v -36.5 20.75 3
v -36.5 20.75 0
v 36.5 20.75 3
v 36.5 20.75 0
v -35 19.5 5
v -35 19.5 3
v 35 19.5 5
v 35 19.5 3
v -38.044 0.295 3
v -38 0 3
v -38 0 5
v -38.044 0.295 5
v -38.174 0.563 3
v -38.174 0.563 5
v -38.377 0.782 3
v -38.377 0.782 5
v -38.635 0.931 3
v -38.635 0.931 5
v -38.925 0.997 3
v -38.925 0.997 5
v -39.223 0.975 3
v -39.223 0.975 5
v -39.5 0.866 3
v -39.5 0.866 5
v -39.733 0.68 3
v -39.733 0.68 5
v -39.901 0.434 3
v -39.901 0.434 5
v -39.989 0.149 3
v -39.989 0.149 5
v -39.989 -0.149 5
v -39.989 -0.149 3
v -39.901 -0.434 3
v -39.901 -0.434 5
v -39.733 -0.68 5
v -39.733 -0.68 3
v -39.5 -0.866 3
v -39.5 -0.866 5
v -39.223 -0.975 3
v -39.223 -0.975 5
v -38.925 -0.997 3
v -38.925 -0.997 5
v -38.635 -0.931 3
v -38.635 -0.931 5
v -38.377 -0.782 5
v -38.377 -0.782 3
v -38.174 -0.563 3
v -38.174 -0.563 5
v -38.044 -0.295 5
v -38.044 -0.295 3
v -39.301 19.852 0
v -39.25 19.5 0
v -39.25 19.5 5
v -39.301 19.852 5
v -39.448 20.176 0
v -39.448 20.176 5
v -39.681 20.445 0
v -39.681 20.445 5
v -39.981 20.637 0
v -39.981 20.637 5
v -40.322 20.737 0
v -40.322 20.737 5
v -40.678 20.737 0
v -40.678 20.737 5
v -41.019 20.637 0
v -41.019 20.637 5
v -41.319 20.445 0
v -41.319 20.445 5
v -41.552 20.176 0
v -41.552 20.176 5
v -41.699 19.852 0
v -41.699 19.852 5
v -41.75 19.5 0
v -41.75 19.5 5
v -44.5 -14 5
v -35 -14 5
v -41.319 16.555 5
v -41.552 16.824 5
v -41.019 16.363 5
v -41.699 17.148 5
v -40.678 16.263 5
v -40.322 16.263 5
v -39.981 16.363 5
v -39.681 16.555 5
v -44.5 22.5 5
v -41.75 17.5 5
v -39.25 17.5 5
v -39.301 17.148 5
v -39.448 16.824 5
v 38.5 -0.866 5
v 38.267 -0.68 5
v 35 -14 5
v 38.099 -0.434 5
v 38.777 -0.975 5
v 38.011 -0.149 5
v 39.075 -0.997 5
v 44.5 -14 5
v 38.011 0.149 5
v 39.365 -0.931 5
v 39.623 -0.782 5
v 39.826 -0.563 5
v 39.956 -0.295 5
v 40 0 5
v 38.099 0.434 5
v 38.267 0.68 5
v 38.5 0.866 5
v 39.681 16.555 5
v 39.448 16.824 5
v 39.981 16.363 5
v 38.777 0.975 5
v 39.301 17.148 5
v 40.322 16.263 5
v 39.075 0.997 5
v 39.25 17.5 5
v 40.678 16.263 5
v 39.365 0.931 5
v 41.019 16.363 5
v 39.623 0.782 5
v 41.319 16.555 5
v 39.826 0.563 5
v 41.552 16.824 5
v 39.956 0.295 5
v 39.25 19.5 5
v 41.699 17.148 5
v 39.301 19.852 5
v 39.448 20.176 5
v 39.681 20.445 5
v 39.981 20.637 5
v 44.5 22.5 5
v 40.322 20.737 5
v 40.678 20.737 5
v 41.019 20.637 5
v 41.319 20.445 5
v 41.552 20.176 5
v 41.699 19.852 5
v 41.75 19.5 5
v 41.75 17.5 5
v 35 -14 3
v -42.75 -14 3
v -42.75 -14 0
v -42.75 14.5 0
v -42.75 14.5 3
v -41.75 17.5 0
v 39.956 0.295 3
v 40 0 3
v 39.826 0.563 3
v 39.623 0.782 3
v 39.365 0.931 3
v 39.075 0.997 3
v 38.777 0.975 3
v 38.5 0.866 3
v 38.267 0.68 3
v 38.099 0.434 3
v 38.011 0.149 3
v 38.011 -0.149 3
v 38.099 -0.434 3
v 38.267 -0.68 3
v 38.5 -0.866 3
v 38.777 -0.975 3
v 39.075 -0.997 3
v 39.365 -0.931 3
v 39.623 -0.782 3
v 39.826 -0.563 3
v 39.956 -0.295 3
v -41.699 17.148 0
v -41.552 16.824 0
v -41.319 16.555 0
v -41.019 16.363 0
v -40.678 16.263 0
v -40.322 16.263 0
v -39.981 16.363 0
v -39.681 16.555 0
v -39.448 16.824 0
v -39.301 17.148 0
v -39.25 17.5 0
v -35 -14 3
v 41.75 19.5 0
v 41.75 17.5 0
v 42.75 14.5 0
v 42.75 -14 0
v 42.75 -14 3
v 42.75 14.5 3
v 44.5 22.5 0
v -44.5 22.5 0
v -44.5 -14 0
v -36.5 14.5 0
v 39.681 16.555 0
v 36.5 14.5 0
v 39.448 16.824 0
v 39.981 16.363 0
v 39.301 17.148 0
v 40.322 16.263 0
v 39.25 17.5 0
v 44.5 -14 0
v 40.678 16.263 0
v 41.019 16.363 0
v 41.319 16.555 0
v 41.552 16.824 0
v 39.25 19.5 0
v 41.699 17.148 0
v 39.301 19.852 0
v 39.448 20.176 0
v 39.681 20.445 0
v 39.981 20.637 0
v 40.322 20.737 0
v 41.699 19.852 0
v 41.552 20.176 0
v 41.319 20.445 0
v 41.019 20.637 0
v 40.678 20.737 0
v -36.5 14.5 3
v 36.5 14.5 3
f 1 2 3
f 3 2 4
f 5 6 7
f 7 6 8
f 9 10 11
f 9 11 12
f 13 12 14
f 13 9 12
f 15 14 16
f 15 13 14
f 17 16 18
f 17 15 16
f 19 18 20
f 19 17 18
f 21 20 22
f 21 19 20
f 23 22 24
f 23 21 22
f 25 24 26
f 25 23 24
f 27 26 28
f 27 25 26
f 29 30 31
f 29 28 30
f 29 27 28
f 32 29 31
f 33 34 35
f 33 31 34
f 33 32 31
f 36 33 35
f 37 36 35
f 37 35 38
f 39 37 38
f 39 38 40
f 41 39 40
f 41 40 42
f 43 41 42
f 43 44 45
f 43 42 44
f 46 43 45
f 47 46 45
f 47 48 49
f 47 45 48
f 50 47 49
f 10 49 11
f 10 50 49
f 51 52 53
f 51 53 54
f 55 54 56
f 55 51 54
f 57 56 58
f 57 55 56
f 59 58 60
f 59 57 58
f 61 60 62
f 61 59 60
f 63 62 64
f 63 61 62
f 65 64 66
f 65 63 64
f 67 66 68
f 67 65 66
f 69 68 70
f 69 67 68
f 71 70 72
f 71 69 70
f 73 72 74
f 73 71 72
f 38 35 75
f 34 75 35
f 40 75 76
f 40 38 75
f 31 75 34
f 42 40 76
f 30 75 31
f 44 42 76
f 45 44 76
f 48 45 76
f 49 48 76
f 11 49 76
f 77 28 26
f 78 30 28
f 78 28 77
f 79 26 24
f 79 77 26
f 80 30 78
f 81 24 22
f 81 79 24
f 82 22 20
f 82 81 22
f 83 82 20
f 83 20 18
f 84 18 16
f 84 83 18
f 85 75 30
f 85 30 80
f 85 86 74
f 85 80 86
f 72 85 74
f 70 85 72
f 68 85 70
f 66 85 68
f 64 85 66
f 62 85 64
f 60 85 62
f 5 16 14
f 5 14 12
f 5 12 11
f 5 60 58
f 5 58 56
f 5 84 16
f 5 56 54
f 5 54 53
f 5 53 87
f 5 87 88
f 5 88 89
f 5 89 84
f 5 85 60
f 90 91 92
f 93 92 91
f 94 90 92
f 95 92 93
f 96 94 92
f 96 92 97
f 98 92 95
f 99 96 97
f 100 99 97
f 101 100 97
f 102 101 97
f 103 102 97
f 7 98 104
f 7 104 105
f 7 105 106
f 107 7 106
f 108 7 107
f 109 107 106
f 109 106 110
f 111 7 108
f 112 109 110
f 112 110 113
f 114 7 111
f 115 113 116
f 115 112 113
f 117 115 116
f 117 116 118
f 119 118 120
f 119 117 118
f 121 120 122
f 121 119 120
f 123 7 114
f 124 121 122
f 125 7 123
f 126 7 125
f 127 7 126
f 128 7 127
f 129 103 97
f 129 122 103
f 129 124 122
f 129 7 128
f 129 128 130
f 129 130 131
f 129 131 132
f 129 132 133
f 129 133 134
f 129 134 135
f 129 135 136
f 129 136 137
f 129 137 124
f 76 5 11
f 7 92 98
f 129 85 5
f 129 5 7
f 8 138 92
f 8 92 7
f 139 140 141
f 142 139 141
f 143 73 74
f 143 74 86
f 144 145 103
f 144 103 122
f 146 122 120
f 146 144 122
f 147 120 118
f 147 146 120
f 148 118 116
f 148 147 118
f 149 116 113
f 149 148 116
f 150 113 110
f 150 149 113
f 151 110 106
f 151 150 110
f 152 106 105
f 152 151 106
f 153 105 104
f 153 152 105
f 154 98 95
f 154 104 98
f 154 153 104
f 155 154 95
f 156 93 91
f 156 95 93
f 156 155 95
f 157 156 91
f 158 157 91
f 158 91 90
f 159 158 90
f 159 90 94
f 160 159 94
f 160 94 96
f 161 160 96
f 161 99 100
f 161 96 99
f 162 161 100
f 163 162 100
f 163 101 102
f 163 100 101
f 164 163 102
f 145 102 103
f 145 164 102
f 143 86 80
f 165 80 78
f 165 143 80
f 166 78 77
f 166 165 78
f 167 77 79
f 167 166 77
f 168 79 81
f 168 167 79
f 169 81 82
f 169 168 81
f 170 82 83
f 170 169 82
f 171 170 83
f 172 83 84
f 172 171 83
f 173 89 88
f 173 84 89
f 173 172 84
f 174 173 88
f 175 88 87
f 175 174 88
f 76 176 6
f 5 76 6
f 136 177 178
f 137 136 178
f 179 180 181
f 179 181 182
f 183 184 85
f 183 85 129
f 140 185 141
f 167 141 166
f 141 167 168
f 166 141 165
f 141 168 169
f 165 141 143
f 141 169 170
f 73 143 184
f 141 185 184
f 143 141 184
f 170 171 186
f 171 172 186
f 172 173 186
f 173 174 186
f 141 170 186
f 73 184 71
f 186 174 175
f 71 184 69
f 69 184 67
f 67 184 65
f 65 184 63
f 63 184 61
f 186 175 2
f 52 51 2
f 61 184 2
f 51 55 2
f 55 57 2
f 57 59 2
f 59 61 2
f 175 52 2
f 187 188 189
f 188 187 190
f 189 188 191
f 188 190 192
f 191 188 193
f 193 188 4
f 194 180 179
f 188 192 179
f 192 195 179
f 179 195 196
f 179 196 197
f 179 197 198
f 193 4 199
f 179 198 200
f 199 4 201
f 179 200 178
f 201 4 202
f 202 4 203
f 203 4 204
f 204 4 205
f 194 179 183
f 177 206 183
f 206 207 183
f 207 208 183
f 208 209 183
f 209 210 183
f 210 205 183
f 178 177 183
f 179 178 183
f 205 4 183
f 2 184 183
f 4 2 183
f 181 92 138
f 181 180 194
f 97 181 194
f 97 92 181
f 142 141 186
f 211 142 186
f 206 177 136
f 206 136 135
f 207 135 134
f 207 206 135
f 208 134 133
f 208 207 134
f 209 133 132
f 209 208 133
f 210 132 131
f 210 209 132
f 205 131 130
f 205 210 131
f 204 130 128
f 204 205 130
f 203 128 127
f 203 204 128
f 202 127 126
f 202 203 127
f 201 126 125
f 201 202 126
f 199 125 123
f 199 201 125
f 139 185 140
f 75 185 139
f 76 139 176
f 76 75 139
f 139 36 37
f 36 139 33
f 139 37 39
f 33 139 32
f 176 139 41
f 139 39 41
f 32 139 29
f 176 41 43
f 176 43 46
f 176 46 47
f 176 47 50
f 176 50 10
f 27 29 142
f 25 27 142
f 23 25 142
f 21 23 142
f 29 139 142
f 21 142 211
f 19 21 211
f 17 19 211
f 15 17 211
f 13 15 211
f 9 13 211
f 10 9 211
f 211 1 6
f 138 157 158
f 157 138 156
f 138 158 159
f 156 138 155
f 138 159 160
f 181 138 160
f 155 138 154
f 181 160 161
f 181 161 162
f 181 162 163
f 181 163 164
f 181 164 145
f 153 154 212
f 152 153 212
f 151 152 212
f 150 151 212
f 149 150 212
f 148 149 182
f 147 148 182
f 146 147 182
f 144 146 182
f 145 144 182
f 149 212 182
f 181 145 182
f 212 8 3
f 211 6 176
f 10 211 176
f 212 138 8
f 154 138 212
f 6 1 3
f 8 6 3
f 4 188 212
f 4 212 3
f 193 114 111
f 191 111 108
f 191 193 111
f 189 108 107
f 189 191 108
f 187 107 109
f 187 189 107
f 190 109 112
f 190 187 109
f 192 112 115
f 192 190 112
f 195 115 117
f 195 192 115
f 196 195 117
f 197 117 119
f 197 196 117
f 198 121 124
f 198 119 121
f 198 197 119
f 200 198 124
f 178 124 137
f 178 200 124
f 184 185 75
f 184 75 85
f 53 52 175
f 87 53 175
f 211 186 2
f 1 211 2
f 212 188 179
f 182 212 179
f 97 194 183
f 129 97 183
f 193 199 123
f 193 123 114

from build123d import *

# Parameters (mm, degrees)
F0_W      = 89
F0_H      = 45
F1_DEPTH  = 5
F2_W      = 70
F2_H      = 39
F3_DEPTH  = 25
F4_W      = 85.5
F4_H      = 41.5
F5_DEPTH  = 3
F6_W      = 8
F6_H      = 8
F7_DEPTH  = 3
F8_R      = 1
F9_DEPTH  = 25
F10_DEPTH = 25
F11_W     = 2.5
F11_H     = 2
F12_DEPTH = 25
F13_W     = 89
F13_H     = 8.5
F14_DEPTH = 25


with BuildPart() as f1:
    # F0 (on Top) → F1 (new body)
    with BuildSketch(Plane.XY):
        Rectangle(F0_W, F0_H)
    extrude(amount=F1_DEPTH)

    # F2 (on Top) → F3 (cut)
    with BuildSketch(Plane.XY):
        Rectangle(F2_W, F2_H)
    extrude(amount=F3_DEPTH, mode=Mode.SUBTRACT)

    # F4 (on Top) → F5 (cut)
    with BuildSketch(Plane.XY):
        Rectangle(F4_W, F4_H)
    extrude(amount=F5_DEPTH, mode=Mode.SUBTRACT)

    # F6 (on Top) → F7 (join)
    with BuildSketch(Plane.XY):
        with Locations((-40.5, 18.5)):
            Rectangle(F6_W, F6_H)
        with Locations((-40.5, -18.5)):
            Rectangle(F6_W, F6_H)
        with Locations((40.5, 18.5)):
            Rectangle(F6_W, F6_H)
        with Locations((40.5, -18.5)):
            Rectangle(F6_W, F6_H)
    extrude(amount=F7_DEPTH)

    # F8 (on Top) → F9 (cut)
    with BuildSketch(Plane.XY):
        with BuildLine():
            ThreePointArc((41.25, 18.5), (41.618034, 18.940983), (41.75, 19.5))
            ThreePointArc((41.75, 19.5), (39.940983, 20.618034), (39.75, 18.5))
            ThreePointArc((39.75, 18.5), (40.5, 18.75), (41.25, 18.5))
        make_face()
        with BuildLine():
            ThreePointArc((41.25, 18.5), (40.5, 18.25), (39.75, 18.5))
            ThreePointArc((39.75, 18.5), (39.940983, 16.381966), (41.75, 17.5))
            ThreePointArc((41.75, 17.5), (41.618034, 18.059017), (41.25, 18.5))
        make_face()
        with BuildLine():
            ThreePointArc((-39.75, 18.5), (-39.381966, 18.940983), (-39.25, 19.5))
            ThreePointArc((-39.25, 19.5), (-41.059017, 20.618034), (-41.25, 18.5))
            ThreePointArc((-41.25, 18.5), (-40.5, 18.75), (-39.75, 18.5))
        make_face()
        with BuildLine():
            ThreePointArc((-39.75, 18.5), (-40.5, 18.25), (-41.25, 18.5))
            ThreePointArc((-41.25, 18.5), (-41.059017, 16.381966), (-39.25, 17.5))
            ThreePointArc((-39.25, 17.5), (-39.381966, 18.059017), (-39.75, 18.5))
        make_face()
        with Locations((-39, 0)):
            Circle(F8_R)
        with Locations((39, 0)):
            Circle(F8_R)
    extrude(amount=F9_DEPTH, mode=Mode.SUBTRACT)

    # F8 (on Top) → F10 (cut)
    with BuildSketch(Plane.XY):
        with BuildLine():
            ThreePointArc((41.25, 18.5), (41.618034, 18.940983), (41.75, 19.5))
            ThreePointArc((41.75, 19.5), (39.940983, 20.618034), (39.75, 18.5))
            ThreePointArc((39.75, 18.5), (40.5, 18.75), (41.25, 18.5))
        make_face()
        with BuildLine():
            ThreePointArc((41.25, 18.5), (40.5, 18.25), (39.75, 18.5))
            ThreePointArc((39.75, 18.5), (39.940983, 16.381966), (41.75, 17.5))
            ThreePointArc((41.75, 17.5), (41.618034, 18.059017), (41.25, 18.5))
        make_face()
        with BuildLine():
            ThreePointArc((-39.75, 18.5), (-39.381966, 18.940983), (-39.25, 19.5))
            ThreePointArc((-39.25, 19.5), (-41.059017, 20.618034), (-41.25, 18.5))
            ThreePointArc((-41.25, 18.5), (-40.5, 18.75), (-39.75, 18.5))
        make_face()
        with BuildLine():
            ThreePointArc((-39.75, 18.5), (-40.5, 18.25), (-41.25, 18.5))
            ThreePointArc((-41.25, 18.5), (-41.059017, 16.381966), (-39.25, 17.5))
            ThreePointArc((-39.25, 17.5), (-39.381966, 18.059017), (-39.75, 18.5))
        make_face()
        with Locations((-39, 0)):
            Circle(F8_R)
        with Locations((39, 0)):
            Circle(F8_R)
    extrude(amount=F10_DEPTH, mode=Mode.SUBTRACT)

    # F11 (on face) → F12 (cut)
    with BuildSketch(Plane(origin=(0, 0, 0), x_dir=(1, 0, 0), z_dir=(0, 0, -1))):
        with Locations((-40.5, -18.5)):
            Rectangle(F11_W, F11_H)
        with Locations((40.5, -18.5)):
            Rectangle(F11_W, F11_H)
    extrude(amount=-F12_DEPTH, mode=Mode.SUBTRACT)

    # F13 (on face) → F14 (cut)
    with BuildSketch(Plane.XY.offset(5)):
        with Locations((0, -18.25)):
            Rectangle(F13_W, F13_H)
    extrude(amount=-F14_DEPTH, mode=Mode.SUBTRACT)


solid = f1.part
